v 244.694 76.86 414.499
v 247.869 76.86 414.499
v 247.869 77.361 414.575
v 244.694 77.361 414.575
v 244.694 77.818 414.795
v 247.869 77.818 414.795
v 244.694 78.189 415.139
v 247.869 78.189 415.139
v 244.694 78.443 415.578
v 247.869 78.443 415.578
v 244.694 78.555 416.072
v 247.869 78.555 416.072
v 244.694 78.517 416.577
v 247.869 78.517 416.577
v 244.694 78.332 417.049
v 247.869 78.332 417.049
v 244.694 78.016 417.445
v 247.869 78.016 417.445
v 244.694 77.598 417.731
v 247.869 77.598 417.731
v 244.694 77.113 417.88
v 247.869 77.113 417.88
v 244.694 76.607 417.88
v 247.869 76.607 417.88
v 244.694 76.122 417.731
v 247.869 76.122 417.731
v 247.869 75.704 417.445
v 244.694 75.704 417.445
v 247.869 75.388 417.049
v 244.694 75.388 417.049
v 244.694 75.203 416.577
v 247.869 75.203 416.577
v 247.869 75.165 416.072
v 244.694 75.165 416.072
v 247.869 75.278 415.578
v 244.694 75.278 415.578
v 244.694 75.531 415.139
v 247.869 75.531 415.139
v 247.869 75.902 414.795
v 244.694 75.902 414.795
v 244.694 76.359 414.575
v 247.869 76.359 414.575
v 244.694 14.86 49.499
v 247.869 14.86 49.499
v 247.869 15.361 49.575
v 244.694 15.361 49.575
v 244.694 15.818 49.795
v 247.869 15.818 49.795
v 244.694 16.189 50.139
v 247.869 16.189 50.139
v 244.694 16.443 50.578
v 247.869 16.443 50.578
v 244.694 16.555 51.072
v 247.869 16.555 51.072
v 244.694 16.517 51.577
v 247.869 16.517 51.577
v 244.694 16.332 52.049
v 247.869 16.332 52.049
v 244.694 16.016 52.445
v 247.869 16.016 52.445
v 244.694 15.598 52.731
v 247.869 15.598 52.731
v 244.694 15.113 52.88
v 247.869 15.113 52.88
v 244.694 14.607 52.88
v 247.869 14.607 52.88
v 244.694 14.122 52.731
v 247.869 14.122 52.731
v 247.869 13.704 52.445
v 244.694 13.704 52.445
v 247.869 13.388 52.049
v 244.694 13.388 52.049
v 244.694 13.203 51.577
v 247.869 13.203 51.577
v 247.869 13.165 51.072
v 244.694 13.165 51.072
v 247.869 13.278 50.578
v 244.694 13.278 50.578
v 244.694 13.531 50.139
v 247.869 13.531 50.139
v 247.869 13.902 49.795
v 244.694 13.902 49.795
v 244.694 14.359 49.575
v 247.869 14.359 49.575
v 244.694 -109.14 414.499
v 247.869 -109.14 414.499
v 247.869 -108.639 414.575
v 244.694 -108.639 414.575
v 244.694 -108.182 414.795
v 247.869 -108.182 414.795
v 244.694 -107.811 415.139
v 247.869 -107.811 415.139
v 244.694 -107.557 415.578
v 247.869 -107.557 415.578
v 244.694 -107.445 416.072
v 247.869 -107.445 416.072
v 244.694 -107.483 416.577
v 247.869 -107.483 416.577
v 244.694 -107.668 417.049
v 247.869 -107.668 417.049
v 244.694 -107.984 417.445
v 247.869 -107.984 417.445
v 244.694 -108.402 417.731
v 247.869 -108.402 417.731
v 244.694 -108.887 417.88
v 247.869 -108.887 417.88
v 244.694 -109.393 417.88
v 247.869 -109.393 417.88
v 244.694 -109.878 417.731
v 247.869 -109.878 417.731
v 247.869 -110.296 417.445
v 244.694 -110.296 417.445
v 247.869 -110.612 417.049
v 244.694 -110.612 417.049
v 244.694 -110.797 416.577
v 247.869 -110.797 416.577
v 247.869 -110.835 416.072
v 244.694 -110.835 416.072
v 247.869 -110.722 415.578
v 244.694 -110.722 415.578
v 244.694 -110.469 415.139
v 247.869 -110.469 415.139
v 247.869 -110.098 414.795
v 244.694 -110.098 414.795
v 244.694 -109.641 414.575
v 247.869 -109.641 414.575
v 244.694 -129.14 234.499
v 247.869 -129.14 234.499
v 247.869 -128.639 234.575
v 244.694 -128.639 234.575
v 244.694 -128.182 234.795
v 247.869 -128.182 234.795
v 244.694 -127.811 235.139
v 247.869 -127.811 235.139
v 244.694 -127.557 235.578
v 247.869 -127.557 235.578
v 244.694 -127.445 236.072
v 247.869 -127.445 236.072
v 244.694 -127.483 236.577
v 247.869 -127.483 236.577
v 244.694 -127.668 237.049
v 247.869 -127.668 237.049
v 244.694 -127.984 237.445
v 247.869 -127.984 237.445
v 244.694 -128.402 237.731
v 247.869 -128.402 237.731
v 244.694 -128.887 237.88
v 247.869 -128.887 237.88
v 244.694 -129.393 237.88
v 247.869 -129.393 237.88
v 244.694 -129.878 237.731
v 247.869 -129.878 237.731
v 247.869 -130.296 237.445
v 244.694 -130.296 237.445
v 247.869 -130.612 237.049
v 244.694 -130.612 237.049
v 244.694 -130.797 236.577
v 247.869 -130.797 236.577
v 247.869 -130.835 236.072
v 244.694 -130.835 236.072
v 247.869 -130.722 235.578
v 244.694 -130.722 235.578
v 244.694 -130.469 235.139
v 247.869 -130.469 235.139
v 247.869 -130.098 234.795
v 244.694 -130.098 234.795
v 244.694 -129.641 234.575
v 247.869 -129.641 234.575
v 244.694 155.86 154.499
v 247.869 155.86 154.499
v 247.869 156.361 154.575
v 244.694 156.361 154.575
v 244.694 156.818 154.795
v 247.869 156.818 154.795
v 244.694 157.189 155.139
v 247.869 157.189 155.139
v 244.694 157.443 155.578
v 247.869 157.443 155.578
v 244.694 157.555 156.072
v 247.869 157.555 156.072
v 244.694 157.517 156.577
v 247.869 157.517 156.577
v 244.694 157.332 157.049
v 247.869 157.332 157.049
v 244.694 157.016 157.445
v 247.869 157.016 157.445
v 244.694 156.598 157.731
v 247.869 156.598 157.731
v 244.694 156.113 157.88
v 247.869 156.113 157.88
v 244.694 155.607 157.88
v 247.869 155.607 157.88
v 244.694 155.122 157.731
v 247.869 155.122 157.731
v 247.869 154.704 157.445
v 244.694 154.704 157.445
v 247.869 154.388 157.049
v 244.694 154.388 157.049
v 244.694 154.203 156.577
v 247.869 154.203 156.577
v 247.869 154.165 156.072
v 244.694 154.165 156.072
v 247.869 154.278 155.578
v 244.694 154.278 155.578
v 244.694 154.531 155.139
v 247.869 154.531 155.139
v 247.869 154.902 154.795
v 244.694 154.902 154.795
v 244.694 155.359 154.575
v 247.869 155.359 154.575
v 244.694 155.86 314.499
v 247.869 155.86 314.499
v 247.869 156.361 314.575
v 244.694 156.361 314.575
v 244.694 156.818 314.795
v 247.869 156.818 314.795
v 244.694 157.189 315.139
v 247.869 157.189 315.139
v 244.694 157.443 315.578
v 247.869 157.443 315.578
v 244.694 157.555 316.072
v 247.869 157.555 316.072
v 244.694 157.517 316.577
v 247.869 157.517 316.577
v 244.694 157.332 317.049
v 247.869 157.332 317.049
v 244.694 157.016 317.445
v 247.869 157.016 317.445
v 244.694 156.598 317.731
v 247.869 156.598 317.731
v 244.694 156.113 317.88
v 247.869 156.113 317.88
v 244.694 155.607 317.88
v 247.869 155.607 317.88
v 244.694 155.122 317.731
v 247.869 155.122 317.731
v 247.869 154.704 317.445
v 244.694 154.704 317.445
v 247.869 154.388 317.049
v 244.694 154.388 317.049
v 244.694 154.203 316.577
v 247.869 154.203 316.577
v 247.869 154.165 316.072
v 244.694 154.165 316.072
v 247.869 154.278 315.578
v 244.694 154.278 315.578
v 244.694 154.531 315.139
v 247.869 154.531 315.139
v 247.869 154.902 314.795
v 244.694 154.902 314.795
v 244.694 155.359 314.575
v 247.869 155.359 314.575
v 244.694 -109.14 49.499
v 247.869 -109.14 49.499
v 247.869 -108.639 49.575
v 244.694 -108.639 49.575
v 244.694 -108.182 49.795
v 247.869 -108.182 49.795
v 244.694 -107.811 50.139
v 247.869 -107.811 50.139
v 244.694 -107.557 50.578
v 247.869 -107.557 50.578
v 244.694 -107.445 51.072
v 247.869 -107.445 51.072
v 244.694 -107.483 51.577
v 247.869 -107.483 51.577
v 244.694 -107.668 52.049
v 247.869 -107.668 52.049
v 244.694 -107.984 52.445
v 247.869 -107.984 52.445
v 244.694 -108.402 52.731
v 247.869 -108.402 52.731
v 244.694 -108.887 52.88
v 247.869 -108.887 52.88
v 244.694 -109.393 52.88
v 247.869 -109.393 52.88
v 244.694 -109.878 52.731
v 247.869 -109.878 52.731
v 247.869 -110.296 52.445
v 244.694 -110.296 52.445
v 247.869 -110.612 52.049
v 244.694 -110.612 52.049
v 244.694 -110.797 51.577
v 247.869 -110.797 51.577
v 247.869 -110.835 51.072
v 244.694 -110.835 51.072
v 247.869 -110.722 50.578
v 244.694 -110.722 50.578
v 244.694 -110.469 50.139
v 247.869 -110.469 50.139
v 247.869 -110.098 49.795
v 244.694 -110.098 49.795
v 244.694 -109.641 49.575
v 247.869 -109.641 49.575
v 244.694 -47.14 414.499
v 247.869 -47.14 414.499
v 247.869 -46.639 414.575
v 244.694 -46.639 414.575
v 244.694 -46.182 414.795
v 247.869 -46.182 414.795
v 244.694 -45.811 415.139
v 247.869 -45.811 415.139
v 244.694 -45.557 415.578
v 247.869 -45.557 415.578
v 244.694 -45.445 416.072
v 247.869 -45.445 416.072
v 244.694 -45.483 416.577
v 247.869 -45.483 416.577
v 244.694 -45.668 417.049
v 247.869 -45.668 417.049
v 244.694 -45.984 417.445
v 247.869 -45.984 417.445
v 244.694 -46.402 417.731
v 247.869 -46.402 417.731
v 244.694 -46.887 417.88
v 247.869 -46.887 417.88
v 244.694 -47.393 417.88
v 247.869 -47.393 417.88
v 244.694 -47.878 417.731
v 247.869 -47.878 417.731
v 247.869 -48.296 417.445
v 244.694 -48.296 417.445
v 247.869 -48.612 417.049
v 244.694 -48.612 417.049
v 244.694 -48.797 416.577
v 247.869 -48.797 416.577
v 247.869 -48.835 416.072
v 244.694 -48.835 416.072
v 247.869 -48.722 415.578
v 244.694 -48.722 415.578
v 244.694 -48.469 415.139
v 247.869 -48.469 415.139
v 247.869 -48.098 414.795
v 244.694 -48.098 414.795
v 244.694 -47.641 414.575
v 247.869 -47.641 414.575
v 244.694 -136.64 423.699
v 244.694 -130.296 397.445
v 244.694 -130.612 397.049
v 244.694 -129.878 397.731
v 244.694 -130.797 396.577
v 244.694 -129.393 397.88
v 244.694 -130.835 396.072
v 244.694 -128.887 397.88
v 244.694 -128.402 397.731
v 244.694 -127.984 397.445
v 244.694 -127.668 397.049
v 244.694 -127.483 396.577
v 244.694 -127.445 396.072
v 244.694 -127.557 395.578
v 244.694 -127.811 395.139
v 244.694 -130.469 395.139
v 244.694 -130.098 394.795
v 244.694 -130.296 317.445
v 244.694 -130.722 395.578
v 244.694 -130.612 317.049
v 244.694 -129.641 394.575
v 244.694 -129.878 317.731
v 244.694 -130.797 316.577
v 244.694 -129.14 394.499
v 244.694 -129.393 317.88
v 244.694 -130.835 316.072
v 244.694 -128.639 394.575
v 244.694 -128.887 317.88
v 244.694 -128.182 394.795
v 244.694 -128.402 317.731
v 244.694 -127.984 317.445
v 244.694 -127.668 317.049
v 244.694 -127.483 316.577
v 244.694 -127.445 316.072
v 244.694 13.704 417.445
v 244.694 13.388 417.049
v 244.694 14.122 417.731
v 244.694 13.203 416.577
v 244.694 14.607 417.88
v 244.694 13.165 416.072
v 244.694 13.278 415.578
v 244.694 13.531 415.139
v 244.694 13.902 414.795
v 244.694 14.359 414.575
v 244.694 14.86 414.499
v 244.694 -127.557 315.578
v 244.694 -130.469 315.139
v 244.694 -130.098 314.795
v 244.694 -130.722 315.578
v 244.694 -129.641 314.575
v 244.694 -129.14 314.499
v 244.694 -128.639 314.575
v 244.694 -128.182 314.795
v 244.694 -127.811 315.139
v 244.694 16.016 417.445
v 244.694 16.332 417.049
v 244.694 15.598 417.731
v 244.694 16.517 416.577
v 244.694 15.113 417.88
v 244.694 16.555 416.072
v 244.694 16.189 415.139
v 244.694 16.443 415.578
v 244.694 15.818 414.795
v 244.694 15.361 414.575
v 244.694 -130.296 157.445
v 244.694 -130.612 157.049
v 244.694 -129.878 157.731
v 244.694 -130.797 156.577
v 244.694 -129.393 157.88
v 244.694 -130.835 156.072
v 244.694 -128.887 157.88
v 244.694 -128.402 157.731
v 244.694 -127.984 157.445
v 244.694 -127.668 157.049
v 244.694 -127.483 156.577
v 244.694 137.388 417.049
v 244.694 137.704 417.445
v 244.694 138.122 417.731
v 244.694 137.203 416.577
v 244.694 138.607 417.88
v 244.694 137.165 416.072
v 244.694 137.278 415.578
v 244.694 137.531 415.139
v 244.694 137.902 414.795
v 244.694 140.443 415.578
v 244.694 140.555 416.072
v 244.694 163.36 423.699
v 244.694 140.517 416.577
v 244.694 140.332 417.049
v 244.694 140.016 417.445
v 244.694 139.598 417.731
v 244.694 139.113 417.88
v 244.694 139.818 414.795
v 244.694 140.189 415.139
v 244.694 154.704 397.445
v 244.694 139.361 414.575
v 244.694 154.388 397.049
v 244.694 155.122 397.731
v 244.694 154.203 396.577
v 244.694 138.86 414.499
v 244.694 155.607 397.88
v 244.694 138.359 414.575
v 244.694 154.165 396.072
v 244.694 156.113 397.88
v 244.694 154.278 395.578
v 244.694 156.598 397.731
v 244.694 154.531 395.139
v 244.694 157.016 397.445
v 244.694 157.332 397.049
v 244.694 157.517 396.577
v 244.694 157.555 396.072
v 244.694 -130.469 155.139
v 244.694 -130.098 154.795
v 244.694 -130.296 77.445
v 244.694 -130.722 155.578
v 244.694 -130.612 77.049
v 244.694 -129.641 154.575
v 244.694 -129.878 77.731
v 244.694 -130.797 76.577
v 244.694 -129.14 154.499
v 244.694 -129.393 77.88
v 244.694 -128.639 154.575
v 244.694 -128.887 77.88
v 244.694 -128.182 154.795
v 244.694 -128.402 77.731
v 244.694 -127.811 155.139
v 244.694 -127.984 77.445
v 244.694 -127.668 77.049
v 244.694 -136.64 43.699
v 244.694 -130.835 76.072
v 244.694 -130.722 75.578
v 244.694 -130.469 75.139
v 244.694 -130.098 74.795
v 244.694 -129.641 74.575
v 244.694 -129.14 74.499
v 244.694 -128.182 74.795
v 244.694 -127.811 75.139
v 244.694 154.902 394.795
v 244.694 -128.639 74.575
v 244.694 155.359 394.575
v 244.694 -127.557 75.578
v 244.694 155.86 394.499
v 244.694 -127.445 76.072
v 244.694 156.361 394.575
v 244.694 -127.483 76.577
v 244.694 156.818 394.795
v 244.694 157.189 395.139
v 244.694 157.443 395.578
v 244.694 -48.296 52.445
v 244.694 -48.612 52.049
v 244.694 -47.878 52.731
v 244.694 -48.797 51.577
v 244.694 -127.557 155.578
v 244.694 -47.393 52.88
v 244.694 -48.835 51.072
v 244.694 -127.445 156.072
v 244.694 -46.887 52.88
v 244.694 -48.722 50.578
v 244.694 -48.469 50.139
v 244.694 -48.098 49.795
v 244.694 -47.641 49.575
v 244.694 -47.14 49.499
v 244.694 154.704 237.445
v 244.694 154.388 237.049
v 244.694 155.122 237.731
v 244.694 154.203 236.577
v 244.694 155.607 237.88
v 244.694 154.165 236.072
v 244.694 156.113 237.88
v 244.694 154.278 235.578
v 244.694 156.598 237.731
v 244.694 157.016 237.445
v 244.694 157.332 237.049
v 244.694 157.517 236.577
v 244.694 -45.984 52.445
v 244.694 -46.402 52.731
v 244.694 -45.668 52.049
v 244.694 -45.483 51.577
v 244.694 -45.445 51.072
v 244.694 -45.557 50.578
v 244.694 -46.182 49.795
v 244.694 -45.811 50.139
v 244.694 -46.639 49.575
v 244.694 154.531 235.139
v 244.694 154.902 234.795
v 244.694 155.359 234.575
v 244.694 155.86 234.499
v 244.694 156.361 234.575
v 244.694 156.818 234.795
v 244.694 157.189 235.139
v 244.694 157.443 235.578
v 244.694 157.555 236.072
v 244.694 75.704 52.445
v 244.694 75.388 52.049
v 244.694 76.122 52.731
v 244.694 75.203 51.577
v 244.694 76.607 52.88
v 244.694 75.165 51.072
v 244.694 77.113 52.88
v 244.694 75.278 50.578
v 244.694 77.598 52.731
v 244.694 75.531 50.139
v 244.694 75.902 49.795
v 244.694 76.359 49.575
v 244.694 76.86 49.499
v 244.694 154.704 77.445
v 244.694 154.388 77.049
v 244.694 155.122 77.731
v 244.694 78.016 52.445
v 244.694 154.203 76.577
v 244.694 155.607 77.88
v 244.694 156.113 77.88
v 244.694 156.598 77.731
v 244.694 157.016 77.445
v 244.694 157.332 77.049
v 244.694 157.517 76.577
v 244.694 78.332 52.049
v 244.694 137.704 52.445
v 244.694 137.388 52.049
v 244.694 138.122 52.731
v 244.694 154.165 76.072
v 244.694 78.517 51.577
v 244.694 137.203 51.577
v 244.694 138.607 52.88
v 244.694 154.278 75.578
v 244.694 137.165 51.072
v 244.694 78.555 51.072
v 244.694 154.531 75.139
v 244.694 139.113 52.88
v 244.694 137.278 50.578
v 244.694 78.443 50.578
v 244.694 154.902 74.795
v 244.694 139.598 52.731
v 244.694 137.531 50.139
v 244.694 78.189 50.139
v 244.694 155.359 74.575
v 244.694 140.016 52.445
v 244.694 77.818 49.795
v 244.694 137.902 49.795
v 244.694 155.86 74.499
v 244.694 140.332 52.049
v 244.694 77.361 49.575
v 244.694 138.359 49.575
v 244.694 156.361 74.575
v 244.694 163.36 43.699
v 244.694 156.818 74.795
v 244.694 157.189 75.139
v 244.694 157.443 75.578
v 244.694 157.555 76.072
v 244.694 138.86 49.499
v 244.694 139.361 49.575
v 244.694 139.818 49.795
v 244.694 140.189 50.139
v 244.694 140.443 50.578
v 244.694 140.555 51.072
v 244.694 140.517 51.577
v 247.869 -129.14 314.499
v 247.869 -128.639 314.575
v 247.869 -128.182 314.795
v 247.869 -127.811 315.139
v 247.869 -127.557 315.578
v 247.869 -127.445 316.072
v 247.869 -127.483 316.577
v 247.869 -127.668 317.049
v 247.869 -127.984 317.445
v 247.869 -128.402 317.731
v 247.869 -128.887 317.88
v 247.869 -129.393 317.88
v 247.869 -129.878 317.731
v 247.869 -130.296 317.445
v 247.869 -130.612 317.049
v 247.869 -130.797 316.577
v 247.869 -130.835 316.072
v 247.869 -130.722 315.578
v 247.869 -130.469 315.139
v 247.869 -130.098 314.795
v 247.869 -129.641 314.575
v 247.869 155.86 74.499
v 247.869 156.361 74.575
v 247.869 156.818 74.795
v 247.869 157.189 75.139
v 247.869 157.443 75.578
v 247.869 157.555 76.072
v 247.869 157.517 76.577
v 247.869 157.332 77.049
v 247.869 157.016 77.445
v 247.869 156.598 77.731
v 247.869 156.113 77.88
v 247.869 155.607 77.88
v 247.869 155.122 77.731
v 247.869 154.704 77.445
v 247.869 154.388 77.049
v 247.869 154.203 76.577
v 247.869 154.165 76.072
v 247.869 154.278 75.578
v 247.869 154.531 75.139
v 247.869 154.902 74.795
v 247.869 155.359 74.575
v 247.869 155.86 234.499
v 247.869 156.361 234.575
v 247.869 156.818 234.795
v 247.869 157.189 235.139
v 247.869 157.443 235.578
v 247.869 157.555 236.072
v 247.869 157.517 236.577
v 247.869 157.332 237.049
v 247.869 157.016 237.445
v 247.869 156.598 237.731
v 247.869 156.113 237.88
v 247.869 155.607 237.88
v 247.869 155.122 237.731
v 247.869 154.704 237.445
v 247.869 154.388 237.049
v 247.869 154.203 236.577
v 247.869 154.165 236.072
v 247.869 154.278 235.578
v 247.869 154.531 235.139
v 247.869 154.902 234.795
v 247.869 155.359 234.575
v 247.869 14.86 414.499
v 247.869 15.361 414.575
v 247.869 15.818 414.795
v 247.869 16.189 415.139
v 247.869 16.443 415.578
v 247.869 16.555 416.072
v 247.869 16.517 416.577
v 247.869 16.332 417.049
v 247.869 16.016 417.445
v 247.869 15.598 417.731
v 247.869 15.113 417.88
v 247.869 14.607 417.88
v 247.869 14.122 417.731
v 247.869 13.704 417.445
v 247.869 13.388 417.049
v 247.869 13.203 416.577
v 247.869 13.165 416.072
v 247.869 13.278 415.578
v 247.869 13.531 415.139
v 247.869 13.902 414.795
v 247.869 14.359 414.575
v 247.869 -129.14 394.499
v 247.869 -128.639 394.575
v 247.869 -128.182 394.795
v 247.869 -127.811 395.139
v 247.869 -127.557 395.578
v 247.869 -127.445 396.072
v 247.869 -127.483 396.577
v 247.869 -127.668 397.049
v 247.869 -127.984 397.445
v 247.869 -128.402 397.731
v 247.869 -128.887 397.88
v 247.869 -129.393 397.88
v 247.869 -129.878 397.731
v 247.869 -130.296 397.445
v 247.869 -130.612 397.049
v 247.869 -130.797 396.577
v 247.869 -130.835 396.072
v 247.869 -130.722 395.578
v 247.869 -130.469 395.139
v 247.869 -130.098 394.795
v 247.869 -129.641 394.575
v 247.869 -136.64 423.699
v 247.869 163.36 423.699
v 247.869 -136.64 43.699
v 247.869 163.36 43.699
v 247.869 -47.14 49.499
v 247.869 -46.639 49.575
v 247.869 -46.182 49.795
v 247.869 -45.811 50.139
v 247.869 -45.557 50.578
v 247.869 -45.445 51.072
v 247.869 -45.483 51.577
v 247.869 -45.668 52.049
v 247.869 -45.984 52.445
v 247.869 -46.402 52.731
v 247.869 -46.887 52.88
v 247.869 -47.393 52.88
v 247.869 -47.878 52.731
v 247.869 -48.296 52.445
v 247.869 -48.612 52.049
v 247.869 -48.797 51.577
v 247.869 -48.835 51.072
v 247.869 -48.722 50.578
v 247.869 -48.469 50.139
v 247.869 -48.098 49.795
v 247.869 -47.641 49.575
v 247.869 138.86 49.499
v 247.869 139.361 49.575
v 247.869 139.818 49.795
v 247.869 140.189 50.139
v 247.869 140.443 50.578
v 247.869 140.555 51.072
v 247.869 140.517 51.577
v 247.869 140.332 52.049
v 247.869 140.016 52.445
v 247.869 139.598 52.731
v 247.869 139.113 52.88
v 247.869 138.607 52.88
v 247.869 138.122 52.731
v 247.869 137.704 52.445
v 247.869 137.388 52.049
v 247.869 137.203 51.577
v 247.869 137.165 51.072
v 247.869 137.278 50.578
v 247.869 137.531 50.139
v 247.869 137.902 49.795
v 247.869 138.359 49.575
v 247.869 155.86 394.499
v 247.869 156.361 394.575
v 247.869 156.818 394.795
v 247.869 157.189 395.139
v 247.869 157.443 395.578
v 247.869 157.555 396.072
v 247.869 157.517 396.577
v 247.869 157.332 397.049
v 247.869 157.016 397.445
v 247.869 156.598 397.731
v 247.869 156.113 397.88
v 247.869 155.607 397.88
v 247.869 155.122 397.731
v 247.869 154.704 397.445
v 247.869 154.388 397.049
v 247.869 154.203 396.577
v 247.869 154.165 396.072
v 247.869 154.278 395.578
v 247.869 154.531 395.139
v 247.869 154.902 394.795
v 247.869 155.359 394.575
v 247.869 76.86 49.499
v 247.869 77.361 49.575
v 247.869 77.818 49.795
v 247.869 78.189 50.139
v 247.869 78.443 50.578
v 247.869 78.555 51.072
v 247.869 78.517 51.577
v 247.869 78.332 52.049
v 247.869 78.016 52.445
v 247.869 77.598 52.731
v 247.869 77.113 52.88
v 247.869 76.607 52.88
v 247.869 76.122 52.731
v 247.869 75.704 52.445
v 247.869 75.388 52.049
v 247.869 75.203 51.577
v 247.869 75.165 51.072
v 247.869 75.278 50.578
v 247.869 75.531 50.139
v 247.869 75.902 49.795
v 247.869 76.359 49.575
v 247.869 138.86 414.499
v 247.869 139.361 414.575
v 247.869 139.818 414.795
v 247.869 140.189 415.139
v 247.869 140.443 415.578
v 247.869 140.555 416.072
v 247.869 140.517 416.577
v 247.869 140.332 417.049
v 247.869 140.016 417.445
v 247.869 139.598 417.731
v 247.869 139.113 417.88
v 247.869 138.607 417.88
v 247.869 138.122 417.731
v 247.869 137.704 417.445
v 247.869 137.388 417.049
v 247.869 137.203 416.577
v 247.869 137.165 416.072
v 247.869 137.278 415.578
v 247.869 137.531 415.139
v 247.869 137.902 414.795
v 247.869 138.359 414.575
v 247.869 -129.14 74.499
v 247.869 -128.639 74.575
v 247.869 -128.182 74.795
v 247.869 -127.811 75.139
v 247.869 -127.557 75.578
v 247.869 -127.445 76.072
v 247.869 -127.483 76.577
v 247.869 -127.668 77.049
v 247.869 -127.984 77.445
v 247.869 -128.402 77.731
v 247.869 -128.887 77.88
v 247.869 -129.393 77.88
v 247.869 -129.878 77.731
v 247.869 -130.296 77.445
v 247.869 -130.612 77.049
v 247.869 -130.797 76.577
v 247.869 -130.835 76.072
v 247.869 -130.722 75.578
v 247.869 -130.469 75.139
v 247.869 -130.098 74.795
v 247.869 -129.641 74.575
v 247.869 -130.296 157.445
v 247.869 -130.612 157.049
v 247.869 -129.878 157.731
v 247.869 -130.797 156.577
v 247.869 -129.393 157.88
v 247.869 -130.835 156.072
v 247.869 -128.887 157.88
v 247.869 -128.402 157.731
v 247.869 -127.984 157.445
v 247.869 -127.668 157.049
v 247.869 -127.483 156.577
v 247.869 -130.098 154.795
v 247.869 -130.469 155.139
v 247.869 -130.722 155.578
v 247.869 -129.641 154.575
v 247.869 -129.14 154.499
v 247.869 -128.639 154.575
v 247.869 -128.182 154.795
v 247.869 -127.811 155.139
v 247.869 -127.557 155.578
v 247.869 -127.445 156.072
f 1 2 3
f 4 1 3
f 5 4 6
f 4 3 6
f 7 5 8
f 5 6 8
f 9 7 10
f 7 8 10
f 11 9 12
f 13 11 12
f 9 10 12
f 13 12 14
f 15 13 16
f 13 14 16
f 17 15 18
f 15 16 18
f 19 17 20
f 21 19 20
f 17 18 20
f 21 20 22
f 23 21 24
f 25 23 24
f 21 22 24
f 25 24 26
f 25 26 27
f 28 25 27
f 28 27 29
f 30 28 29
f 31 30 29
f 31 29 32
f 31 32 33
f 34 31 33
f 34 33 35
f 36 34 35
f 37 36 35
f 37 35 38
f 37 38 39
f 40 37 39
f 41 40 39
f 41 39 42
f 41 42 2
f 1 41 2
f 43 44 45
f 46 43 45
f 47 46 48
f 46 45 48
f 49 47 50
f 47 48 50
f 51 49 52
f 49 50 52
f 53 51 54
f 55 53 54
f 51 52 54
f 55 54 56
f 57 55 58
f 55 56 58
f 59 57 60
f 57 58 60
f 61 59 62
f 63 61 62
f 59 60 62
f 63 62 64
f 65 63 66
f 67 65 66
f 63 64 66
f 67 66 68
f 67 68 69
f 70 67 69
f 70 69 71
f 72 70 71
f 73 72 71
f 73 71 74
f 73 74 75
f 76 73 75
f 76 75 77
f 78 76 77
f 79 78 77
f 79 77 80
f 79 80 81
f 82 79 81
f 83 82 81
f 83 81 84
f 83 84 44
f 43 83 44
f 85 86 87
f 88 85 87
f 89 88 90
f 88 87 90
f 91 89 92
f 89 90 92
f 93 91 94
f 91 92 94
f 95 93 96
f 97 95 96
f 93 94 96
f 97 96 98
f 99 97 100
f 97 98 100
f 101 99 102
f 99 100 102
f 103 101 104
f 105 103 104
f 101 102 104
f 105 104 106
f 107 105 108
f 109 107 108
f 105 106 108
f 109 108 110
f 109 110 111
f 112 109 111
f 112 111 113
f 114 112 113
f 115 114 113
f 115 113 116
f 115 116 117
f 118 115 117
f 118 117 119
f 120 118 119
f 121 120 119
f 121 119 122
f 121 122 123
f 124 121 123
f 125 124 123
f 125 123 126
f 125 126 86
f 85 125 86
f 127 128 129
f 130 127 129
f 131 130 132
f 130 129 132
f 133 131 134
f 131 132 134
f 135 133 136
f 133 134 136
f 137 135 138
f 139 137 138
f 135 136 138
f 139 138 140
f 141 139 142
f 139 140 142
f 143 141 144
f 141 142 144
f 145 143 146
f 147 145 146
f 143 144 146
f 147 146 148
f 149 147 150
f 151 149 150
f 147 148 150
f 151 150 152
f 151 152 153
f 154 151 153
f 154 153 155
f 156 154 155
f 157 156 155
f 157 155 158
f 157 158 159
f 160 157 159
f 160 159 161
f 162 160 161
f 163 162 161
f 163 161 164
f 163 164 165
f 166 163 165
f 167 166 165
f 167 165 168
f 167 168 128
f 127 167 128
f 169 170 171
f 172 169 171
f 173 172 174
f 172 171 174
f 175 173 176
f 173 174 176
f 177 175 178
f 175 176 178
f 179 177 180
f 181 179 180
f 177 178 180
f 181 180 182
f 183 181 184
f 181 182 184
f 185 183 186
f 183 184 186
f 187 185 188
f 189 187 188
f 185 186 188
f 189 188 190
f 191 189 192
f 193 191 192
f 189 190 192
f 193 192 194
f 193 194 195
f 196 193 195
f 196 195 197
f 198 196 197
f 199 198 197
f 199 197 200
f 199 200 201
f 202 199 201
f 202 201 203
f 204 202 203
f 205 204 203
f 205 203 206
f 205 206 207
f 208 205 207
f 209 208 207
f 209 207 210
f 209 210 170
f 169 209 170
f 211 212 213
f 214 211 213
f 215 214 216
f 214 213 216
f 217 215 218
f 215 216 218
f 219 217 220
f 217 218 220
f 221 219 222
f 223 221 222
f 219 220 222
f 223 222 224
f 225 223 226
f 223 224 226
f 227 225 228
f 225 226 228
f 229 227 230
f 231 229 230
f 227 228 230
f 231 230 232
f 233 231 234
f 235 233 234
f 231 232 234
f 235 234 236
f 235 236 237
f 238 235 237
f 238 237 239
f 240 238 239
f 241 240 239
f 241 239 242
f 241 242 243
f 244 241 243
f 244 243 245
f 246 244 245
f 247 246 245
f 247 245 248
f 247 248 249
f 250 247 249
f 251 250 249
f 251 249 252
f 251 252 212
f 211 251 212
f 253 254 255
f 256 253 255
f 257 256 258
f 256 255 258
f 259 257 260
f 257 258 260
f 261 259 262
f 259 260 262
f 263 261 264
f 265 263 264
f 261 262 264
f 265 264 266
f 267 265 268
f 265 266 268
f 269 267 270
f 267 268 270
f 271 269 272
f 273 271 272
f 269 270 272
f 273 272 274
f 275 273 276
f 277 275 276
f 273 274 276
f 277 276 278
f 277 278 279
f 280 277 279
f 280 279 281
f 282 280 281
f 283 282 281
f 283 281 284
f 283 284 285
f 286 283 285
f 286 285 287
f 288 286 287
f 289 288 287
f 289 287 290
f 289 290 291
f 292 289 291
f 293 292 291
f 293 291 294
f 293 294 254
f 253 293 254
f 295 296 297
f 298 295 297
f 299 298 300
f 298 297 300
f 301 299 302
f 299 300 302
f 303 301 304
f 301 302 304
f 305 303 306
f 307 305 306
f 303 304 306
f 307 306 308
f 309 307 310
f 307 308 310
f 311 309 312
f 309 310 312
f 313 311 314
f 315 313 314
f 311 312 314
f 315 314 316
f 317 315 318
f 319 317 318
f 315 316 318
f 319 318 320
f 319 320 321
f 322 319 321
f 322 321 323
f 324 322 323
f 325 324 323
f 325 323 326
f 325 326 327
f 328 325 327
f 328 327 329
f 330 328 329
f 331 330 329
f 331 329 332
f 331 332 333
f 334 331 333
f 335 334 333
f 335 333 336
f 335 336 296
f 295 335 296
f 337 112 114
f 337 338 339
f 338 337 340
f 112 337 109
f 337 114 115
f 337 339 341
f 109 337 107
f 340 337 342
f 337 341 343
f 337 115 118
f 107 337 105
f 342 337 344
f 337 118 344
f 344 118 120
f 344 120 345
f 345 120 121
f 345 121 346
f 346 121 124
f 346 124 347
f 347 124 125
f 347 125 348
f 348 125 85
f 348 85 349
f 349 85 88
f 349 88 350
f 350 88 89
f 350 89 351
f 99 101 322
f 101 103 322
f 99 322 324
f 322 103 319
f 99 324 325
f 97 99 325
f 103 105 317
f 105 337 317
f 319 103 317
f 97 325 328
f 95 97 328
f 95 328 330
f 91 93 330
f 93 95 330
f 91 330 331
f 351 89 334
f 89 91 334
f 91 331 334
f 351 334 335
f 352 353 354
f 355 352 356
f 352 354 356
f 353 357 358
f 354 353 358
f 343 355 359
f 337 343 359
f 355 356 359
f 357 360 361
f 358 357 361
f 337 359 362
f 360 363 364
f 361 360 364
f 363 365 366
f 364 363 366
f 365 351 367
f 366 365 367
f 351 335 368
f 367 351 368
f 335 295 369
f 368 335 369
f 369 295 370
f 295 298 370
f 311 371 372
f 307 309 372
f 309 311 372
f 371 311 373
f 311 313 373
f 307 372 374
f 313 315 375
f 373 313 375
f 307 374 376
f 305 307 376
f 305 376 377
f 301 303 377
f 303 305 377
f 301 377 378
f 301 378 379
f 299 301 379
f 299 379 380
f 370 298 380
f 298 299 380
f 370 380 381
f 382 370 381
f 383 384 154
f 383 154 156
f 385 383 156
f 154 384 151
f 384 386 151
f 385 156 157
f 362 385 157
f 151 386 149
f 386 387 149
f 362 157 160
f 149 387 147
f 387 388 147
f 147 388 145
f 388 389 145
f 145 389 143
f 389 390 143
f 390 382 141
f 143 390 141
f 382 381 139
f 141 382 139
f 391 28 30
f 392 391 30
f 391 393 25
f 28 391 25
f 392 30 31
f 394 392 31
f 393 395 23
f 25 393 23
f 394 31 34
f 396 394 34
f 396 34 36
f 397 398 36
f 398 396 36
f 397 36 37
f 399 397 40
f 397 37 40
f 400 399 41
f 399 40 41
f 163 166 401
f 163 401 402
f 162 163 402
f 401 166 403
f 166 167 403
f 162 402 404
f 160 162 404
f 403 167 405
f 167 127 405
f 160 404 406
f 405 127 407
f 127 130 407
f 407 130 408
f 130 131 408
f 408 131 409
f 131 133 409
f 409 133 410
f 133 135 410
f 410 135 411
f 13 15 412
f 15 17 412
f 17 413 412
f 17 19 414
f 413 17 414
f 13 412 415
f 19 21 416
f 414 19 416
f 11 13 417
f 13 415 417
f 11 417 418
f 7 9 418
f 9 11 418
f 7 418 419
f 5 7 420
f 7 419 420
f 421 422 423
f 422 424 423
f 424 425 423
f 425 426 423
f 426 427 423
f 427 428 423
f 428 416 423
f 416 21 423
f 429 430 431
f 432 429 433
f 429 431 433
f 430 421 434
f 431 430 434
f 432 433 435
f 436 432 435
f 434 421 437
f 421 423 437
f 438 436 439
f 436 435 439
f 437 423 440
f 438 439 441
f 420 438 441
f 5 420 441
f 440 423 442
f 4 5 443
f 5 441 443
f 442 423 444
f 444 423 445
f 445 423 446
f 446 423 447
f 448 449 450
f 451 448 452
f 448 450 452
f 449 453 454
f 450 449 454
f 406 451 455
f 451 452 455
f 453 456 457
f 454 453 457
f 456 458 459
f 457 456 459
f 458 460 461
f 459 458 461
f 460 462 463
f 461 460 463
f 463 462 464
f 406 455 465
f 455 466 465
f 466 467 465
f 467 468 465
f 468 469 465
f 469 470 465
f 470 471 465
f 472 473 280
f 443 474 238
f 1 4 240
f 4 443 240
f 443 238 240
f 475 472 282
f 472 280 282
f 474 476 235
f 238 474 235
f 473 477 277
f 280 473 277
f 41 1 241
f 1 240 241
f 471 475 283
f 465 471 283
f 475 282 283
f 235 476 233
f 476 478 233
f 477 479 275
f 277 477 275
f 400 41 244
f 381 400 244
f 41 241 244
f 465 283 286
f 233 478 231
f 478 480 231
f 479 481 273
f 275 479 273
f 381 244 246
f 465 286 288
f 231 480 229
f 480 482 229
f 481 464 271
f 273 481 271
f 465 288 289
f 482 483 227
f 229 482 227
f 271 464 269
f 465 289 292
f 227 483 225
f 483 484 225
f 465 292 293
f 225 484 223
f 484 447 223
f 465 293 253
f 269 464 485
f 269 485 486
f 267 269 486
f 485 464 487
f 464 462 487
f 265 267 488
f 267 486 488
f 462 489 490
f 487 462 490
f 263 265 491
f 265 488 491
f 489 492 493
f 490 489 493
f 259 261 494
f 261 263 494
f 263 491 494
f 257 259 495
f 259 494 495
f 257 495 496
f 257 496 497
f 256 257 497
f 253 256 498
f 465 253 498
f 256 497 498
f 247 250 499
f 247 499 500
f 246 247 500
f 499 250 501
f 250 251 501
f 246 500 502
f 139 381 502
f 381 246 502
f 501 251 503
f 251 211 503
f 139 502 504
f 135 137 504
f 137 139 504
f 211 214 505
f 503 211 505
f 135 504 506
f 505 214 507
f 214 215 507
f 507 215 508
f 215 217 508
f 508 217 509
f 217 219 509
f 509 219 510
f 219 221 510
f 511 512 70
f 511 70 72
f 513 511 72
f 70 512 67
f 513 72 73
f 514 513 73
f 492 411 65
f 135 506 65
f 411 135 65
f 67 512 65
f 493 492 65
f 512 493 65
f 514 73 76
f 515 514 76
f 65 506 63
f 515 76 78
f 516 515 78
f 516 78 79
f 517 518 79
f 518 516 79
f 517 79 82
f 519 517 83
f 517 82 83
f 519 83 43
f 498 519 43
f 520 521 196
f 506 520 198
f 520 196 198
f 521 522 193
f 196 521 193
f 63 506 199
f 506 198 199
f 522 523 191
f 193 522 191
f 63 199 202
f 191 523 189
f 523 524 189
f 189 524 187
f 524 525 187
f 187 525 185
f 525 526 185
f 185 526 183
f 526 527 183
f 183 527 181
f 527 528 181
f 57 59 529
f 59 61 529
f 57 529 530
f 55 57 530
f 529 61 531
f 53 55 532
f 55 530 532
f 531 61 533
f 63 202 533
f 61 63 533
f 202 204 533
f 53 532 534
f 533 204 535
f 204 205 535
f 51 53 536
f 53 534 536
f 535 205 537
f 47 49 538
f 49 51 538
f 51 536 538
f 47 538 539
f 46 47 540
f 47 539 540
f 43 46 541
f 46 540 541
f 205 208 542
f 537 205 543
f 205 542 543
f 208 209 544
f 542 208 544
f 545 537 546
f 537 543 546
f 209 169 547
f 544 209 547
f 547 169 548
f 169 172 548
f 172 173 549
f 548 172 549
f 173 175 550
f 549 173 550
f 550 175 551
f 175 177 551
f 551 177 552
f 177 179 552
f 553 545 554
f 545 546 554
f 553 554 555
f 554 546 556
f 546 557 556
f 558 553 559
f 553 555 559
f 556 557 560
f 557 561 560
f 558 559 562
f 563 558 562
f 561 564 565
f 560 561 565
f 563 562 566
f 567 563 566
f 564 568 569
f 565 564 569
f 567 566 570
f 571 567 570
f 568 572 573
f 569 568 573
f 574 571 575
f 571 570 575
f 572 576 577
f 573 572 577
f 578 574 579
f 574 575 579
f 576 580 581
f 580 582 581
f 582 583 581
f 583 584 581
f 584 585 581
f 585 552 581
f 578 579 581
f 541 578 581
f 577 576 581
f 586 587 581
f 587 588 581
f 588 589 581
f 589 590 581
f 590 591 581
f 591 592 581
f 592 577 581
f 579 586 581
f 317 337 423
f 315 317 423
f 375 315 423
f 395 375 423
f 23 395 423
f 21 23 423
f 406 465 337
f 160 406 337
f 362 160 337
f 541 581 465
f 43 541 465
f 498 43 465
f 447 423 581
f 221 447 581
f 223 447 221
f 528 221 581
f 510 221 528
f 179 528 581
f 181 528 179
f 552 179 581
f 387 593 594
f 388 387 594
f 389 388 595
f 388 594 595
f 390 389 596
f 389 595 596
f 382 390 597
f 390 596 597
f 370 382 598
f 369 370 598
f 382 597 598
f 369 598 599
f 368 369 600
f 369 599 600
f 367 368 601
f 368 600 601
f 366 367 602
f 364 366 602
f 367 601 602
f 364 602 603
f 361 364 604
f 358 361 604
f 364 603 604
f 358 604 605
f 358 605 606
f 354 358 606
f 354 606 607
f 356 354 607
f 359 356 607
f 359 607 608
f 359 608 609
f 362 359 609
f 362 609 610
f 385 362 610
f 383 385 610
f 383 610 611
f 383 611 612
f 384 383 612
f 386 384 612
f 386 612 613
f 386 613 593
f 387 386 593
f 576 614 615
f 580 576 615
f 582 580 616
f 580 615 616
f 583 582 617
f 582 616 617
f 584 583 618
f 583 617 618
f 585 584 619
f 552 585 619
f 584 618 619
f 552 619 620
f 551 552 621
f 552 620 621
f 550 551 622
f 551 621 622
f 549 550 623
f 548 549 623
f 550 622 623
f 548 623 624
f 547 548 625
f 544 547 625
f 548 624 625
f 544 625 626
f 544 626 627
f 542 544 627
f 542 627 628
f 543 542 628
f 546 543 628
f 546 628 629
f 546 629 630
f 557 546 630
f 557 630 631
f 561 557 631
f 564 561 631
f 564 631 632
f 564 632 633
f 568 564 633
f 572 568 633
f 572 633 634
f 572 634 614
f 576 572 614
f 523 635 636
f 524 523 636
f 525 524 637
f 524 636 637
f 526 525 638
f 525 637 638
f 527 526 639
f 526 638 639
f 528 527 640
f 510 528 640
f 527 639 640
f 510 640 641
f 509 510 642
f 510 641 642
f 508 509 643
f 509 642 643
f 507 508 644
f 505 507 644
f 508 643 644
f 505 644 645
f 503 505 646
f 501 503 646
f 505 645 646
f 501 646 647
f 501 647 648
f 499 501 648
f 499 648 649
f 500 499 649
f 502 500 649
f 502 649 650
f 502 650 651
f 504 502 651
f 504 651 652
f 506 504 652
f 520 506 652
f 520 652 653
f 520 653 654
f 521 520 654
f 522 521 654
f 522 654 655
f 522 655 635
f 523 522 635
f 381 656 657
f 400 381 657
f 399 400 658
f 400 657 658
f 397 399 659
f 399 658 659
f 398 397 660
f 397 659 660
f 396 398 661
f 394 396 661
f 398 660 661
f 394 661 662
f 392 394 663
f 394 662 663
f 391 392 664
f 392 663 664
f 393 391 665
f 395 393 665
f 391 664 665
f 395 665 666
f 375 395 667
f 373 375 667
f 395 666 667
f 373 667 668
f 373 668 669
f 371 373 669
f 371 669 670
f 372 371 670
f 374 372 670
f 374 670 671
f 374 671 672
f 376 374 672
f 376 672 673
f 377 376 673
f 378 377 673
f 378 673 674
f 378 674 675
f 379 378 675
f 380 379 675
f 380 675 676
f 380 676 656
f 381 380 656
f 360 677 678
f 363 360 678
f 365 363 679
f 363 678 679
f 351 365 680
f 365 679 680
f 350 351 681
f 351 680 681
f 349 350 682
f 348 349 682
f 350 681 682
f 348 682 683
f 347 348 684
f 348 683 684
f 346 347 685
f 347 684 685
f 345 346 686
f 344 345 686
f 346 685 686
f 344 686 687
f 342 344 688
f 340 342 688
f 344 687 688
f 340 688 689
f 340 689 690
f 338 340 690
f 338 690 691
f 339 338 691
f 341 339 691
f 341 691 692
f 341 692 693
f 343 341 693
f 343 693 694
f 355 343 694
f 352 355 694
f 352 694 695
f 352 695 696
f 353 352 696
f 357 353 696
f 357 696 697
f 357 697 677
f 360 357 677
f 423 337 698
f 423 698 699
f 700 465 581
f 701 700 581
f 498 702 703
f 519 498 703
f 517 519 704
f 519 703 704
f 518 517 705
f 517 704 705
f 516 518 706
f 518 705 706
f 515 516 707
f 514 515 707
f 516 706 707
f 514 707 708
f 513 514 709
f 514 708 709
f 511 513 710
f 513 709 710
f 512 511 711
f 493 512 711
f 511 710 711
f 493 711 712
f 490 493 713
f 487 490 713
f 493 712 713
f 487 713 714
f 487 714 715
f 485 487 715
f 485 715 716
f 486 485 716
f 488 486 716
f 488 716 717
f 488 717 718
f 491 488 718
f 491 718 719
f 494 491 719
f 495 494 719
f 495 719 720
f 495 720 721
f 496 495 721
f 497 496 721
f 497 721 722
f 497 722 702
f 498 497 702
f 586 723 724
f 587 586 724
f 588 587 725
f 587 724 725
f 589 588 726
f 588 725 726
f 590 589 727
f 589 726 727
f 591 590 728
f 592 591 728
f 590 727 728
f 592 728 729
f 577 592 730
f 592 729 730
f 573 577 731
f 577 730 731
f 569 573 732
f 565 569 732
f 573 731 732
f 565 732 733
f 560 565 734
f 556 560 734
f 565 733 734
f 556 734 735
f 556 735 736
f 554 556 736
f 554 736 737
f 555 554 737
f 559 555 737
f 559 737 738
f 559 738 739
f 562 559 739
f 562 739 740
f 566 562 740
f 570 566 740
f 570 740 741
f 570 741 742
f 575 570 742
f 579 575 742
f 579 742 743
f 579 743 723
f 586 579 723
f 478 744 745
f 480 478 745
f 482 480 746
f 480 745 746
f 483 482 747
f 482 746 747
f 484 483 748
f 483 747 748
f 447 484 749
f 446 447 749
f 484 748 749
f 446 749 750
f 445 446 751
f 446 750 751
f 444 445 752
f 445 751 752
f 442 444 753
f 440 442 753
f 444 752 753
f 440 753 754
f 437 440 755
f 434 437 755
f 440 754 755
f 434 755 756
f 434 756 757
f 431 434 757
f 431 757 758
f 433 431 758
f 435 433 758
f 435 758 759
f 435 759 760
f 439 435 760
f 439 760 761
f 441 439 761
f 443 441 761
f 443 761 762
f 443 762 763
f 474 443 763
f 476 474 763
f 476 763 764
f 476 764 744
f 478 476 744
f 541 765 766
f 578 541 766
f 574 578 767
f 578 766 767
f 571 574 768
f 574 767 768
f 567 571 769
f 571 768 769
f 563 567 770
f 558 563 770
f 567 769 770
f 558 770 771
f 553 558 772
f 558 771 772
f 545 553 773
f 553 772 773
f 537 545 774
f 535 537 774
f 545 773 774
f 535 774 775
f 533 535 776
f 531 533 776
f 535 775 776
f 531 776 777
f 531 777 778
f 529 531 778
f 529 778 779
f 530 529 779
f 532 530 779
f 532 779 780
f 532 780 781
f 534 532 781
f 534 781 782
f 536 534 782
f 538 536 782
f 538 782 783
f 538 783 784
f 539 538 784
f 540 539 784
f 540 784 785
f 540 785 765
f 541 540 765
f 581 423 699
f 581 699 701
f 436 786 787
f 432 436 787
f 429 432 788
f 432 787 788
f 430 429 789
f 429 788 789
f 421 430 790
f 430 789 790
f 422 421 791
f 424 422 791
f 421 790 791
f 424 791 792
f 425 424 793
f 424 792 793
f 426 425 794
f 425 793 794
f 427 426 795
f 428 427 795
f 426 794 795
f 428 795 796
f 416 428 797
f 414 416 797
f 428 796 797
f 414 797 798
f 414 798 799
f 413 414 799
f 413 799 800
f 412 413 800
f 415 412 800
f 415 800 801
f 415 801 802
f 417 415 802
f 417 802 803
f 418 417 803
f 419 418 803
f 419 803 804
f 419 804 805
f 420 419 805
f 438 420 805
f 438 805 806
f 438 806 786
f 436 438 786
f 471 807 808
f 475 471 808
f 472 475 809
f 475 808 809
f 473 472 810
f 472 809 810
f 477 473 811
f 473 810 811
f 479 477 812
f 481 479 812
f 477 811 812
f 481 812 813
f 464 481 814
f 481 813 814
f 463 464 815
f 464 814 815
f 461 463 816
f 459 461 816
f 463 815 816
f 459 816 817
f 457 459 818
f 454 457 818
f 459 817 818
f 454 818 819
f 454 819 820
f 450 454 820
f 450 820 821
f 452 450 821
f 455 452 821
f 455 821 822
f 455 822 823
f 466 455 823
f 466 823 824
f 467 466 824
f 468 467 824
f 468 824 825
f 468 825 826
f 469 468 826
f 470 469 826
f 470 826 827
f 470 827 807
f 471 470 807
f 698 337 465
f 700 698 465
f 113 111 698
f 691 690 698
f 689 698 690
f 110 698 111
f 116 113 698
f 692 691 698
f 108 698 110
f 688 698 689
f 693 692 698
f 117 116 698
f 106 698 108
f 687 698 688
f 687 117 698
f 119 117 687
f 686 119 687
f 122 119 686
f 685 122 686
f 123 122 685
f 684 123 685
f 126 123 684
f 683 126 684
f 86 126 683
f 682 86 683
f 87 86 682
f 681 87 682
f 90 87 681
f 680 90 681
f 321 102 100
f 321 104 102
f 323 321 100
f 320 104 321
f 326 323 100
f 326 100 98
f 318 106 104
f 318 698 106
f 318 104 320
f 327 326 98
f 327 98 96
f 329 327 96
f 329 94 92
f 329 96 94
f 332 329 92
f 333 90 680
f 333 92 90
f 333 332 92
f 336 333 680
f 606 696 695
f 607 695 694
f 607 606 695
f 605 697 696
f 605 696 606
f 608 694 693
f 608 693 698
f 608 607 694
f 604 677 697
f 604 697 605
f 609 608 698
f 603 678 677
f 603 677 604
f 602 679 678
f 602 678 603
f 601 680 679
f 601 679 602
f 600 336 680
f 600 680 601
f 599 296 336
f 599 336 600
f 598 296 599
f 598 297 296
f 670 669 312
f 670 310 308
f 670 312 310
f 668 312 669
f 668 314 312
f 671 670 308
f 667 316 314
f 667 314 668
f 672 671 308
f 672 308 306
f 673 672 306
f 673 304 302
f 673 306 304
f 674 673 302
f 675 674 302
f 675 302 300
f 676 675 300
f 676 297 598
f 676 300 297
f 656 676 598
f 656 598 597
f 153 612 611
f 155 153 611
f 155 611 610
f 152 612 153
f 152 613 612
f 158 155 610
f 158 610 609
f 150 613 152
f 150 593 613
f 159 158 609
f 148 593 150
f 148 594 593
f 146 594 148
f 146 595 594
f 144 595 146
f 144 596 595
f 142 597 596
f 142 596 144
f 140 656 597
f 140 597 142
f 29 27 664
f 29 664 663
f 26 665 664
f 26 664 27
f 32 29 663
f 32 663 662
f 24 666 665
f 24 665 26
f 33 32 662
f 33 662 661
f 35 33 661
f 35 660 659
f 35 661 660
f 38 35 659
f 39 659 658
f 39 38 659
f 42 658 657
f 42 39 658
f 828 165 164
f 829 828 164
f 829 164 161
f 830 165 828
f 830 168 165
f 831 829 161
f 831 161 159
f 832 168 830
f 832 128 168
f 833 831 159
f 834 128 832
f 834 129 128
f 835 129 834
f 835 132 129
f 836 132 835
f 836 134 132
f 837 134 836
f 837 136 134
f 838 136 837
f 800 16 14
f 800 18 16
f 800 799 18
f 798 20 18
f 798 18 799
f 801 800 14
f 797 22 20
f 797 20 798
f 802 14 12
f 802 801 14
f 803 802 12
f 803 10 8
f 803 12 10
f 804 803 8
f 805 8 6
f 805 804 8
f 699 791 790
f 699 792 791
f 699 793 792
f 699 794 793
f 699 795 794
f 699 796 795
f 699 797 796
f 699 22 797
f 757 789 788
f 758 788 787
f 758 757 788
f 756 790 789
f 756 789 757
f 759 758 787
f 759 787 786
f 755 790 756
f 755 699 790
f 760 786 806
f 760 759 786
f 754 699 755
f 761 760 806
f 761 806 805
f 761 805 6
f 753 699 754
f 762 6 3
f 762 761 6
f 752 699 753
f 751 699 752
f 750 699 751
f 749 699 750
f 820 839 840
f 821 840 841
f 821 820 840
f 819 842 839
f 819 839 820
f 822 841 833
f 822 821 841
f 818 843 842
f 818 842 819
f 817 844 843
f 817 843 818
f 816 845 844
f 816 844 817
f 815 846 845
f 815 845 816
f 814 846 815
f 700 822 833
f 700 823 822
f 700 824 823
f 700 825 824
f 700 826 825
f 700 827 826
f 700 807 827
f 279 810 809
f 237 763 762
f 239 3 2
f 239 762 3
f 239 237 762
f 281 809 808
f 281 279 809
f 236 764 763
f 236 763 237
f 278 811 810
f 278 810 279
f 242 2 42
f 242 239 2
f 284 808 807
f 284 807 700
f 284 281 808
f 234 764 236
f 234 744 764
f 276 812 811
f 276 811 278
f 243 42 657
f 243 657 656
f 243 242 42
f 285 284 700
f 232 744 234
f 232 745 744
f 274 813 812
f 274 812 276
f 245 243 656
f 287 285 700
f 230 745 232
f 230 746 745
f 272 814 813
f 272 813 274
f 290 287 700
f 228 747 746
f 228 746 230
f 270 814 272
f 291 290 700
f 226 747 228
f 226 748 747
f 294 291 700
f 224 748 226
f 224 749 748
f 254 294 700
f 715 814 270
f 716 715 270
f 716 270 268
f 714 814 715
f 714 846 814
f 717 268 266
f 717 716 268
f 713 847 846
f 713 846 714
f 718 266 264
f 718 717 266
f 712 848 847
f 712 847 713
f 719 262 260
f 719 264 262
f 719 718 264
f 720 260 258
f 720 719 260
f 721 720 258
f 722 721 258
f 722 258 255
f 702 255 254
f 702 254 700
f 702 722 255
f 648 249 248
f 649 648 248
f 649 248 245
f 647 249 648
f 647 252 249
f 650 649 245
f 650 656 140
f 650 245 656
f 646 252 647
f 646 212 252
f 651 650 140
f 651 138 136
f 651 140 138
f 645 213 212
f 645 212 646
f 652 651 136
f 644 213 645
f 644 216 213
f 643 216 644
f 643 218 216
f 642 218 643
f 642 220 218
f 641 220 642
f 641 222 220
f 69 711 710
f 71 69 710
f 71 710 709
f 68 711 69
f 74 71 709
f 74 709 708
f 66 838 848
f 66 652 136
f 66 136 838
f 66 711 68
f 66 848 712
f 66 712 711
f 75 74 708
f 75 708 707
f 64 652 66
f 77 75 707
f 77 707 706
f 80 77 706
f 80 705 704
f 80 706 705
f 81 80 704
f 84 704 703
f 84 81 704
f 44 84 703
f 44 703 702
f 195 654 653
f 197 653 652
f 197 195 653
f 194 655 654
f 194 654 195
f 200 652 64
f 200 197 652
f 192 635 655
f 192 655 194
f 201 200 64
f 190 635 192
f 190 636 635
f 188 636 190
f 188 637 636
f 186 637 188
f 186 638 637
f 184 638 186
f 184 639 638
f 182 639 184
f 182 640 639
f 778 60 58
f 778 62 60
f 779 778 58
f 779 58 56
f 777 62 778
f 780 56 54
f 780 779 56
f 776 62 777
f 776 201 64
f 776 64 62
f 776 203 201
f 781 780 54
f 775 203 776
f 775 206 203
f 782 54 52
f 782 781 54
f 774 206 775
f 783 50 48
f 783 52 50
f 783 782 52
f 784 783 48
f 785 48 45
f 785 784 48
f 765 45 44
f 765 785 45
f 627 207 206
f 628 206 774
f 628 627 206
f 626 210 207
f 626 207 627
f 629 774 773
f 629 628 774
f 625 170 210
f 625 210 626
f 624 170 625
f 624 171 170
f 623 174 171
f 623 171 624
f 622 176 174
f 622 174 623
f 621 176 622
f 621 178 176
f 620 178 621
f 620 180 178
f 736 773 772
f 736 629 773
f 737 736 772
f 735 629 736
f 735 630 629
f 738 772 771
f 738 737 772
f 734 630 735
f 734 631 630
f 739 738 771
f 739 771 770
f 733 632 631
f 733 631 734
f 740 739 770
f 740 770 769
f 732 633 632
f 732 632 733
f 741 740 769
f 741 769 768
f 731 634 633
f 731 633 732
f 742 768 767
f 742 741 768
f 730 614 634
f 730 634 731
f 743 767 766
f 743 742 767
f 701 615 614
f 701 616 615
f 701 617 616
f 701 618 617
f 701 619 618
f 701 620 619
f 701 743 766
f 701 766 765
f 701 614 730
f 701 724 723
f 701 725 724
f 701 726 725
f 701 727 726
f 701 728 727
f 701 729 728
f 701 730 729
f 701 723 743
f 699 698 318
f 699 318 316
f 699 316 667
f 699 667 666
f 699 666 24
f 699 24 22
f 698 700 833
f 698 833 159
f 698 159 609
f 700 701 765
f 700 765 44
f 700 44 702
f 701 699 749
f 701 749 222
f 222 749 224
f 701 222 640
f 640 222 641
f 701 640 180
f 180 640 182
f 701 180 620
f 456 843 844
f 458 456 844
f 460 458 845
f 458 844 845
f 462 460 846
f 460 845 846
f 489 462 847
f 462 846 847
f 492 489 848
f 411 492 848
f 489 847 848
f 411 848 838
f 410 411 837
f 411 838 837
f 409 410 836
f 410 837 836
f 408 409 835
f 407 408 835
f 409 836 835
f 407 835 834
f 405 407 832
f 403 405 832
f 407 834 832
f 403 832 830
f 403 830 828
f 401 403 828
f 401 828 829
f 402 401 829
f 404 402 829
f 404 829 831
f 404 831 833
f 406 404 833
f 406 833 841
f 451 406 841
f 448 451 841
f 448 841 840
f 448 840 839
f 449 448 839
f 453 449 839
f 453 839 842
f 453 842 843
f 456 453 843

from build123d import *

# Parameters (mm, degrees)
SKETCH1_W         = 380
SKETCH1_H         = 300
PLATE_DEPTH       = 3.175
RAIL_MOUNTS_REACH = 456.112
SKETCH2_R         = 1.7


with BuildPart() as part:
    # Sketch1 → Plate (new body)
    with BuildSketch(Plane(origin=(244.693827342, 0, 0), x_dir=(0, 0, -1), z_dir=(1, 0, 0))):
        with Locations((-233.699106879, 13.360031127)):
            Rectangle(SKETCH1_W, SKETCH1_H)
    extrude(amount=PLATE_DEPTH)

    # Sketch2 → Rail_Mounts (cut, up to next)
    with BuildSketch(Plane(origin=(247.868827342, 0, 0), x_dir=(0, 0, -1), z_dir=(1, 0, 0)), mode=Mode.PRIVATE) as rail_mounts_sk1:
        with Locations((-396.199106879, 155.860031127)):
            Circle(SKETCH2_R)
    rail_mounts_tool1 = extrude(rail_mounts_sk1.sketch, amount=-RAIL_MOUNTS_REACH, mode=Mode.PRIVATE) & part.part
    # Sketch2 → Rail_Mounts (cut, up to next)
    with BuildSketch(Plane(origin=(247.868827342, 0, 0), x_dir=(0, 0, -1), z_dir=(1, 0, 0)), mode=Mode.PRIVATE) as rail_mounts_sk2:
        with Locations((-396.199106879, -129.139968873)):
            Circle(SKETCH2_R)
    rail_mounts_tool2 = extrude(rail_mounts_sk2.sketch, amount=-RAIL_MOUNTS_REACH, mode=Mode.PRIVATE) & part.part
    # Sketch2 → Rail_Mounts (cut, up to next)
    with BuildSketch(Plane(origin=(247.868827342, 0, 0), x_dir=(0, 0, -1), z_dir=(1, 0, 0)), mode=Mode.PRIVATE) as rail_mounts_sk3:
        with Locations((-316.199106879, 155.860031127)):
            Circle(SKETCH2_R)
    rail_mounts_tool3 = extrude(rail_mounts_sk3.sketch, amount=-RAIL_MOUNTS_REACH, mode=Mode.PRIVATE) & part.part
    # Sketch2 → Rail_Mounts (cut, up to next)
    with BuildSketch(Plane(origin=(247.868827342, 0, 0), x_dir=(0, 0, -1), z_dir=(1, 0, 0)), mode=Mode.PRIVATE) as rail_mounts_sk4:
        with Locations((-316.199106879, -129.139968873)):
            Circle(SKETCH2_R)
    rail_mounts_tool4 = extrude(rail_mounts_sk4.sketch, amount=-RAIL_MOUNTS_REACH, mode=Mode.PRIVATE) & part.part
    # Sketch2 → Rail_Mounts (cut, up to next)
    with BuildSketch(Plane(origin=(247.868827342, 0, 0), x_dir=(0, 0, -1), z_dir=(1, 0, 0)), mode=Mode.PRIVATE) as rail_mounts_sk5:
        with Locations((-236.199106879, 155.860031127)):
            Circle(SKETCH2_R)
    rail_mounts_tool5 = extrude(rail_mounts_sk5.sketch, amount=-RAIL_MOUNTS_REACH, mode=Mode.PRIVATE) & part.part
    # Sketch2 → Rail_Mounts (cut, up to next)
    with BuildSketch(Plane(origin=(247.868827342, 0, 0), x_dir=(0, 0, -1), z_dir=(1, 0, 0)), mode=Mode.PRIVATE) as rail_mounts_sk6:
        with Locations((-236.199106879, -129.139968873)):
            Circle(SKETCH2_R)
    rail_mounts_tool6 = extrude(rail_mounts_sk6.sketch, amount=-RAIL_MOUNTS_REACH, mode=Mode.PRIVATE) & part.part
    # Sketch2 → Rail_Mounts (cut, up to next)
    with BuildSketch(Plane(origin=(247.868827342, 0, 0), x_dir=(0, 0, -1), z_dir=(1, 0, 0)), mode=Mode.PRIVATE) as rail_mounts_sk7:
        with Locations((-156.199106879, 155.860031127)):
            Circle(SKETCH2_R)
    rail_mounts_tool7 = extrude(rail_mounts_sk7.sketch, amount=-RAIL_MOUNTS_REACH, mode=Mode.PRIVATE) & part.part
    # Sketch2 → Rail_Mounts (cut, up to next)
    with BuildSketch(Plane(origin=(247.868827342, 0, 0), x_dir=(0, 0, -1), z_dir=(1, 0, 0)), mode=Mode.PRIVATE) as rail_mounts_sk8:
        with Locations((-156.199106879, -129.139968873)):
            Circle(SKETCH2_R)
    rail_mounts_tool8 = extrude(rail_mounts_sk8.sketch, amount=-RAIL_MOUNTS_REACH, mode=Mode.PRIVATE) & part.part
    # Sketch2 → Rail_Mounts (cut, up to next)
    with BuildSketch(Plane(origin=(247.868827342, 0, 0), x_dir=(0, 0, -1), z_dir=(1, 0, 0)), mode=Mode.PRIVATE) as rail_mounts_sk9:
        with Locations((-76.199106879, 155.860031127)):
            Circle(SKETCH2_R)
    rail_mounts_tool9 = extrude(rail_mounts_sk9.sketch, amount=-RAIL_MOUNTS_REACH, mode=Mode.PRIVATE) & part.part
    # Sketch2 → Rail_Mounts (cut, up to next)
    with BuildSketch(Plane(origin=(247.868827342, 0, 0), x_dir=(0, 0, -1), z_dir=(1, 0, 0)), mode=Mode.PRIVATE) as rail_mounts_sk10:
        with Locations((-76.199106879, -129.139968873)):
            Circle(SKETCH2_R)
    rail_mounts_tool10 = extrude(rail_mounts_sk10.sketch, amount=-RAIL_MOUNTS_REACH, mode=Mode.PRIVATE) & part.part
    # Sketch2 → Rail_Mounts (cut, up to next)
    with BuildSketch(Plane(origin=(247.868827342, 0, 0), x_dir=(0, 0, -1), z_dir=(1, 0, 0)), mode=Mode.PRIVATE) as rail_mounts_sk11:
        with Locations((-416.199106879, -109.139968873)):
            Circle(SKETCH2_R)
    rail_mounts_tool11 = extrude(rail_mounts_sk11.sketch, amount=-RAIL_MOUNTS_REACH, mode=Mode.PRIVATE) & part.part
    # Sketch2 → Rail_Mounts (cut, up to next)
    with BuildSketch(Plane(origin=(247.868827342, 0, 0), x_dir=(0, 0, -1), z_dir=(1, 0, 0)), mode=Mode.PRIVATE) as rail_mounts_sk12:
        with Locations((-51.199106879, -109.139968873)):
            Circle(SKETCH2_R)
    rail_mounts_tool12 = extrude(rail_mounts_sk12.sketch, amount=-RAIL_MOUNTS_REACH, mode=Mode.PRIVATE) & part.part
    # Sketch2 → Rail_Mounts (cut, up to next)
    with BuildSketch(Plane(origin=(247.868827342, 0, 0), x_dir=(0, 0, -1), z_dir=(1, 0, 0)), mode=Mode.PRIVATE) as rail_mounts_sk13:
        with Locations((-51.199106879, -47.139968873)):
            Circle(SKETCH2_R)
    rail_mounts_tool13 = extrude(rail_mounts_sk13.sketch, amount=-RAIL_MOUNTS_REACH, mode=Mode.PRIVATE) & part.part
    # Sketch2 → Rail_Mounts (cut, up to next)
    with BuildSketch(Plane(origin=(247.868827342, 0, 0), x_dir=(0, 0, -1), z_dir=(1, 0, 0)), mode=Mode.PRIVATE) as rail_mounts_sk14:
        with Locations((-416.199106879, -47.139968873)):
            Circle(SKETCH2_R)
    rail_mounts_tool14 = extrude(rail_mounts_sk14.sketch, amount=-RAIL_MOUNTS_REACH, mode=Mode.PRIVATE) & part.part
    # Sketch2 → Rail_Mounts (cut, up to next)
    with BuildSketch(Plane(origin=(247.868827342, 0, 0), x_dir=(0, 0, -1), z_dir=(1, 0, 0)), mode=Mode.PRIVATE) as rail_mounts_sk15:
        with Locations((-51.199106879, 14.860031127)):
            Circle(SKETCH2_R)
    rail_mounts_tool15 = extrude(rail_mounts_sk15.sketch, amount=-RAIL_MOUNTS_REACH, mode=Mode.PRIVATE) & part.part
    # Sketch2 → Rail_Mounts (cut, up to next)
    with BuildSketch(Plane(origin=(247.868827342, 0, 0), x_dir=(0, 0, -1), z_dir=(1, 0, 0)), mode=Mode.PRIVATE) as rail_mounts_sk16:
        with Locations((-416.199106879, 14.860031127)):
            Circle(SKETCH2_R)
    rail_mounts_tool16 = extrude(rail_mounts_sk16.sketch, amount=-RAIL_MOUNTS_REACH, mode=Mode.PRIVATE) & part.part
    # Sketch2 → Rail_Mounts (cut, up to next)
    with BuildSketch(Plane(origin=(247.868827342, 0, 0), x_dir=(0, 0, -1), z_dir=(1, 0, 0)), mode=Mode.PRIVATE) as rail_mounts_sk17:
        with Locations((-51.199106879, 76.860031127)):
            Circle(SKETCH2_R)
    rail_mounts_tool17 = extrude(rail_mounts_sk17.sketch, amount=-RAIL_MOUNTS_REACH, mode=Mode.PRIVATE) & part.part
    # Sketch2 → Rail_Mounts (cut, up to next)
    with BuildSketch(Plane(origin=(247.868827342, 0, 0), x_dir=(0, 0, -1), z_dir=(1, 0, 0)), mode=Mode.PRIVATE) as rail_mounts_sk18:
        with Locations((-416.199106879, 76.860031127)):
            Circle(SKETCH2_R)
    rail_mounts_tool18 = extrude(rail_mounts_sk18.sketch, amount=-RAIL_MOUNTS_REACH, mode=Mode.PRIVATE) & part.part
    # Sketch2 → Rail_Mounts (cut, up to next)
    with BuildSketch(Plane(origin=(247.868827342, 0, 0), x_dir=(0, 0, -1), z_dir=(1, 0, 0)), mode=Mode.PRIVATE) as rail_mounts_sk19:
        with Locations((-51.199106879, 138.860031127)):
            Circle(SKETCH2_R)
    rail_mounts_tool19 = extrude(rail_mounts_sk19.sketch, amount=-RAIL_MOUNTS_REACH, mode=Mode.PRIVATE) & part.part
    # Sketch2 → Rail_Mounts (cut, up to next)
    with BuildSketch(Plane(origin=(247.868827342, 0, 0), x_dir=(0, 0, -1), z_dir=(1, 0, 0)), mode=Mode.PRIVATE) as rail_mounts_sk20:
        with Locations((-416.199106879, 138.860031127)):
            Circle(SKETCH2_R)
    rail_mounts_tool20 = extrude(rail_mounts_sk20.sketch, amount=-RAIL_MOUNTS_REACH, mode=Mode.PRIVATE) & part.part
    add(rail_mounts_tool1.solids().sort_by_distance((247.868827, 155.860031, 396.199107))[0], mode=Mode.SUBTRACT)
    add(rail_mounts_tool2.solids().sort_by_distance((247.868827, -129.139969, 396.199107))[0], mode=Mode.SUBTRACT)
    add(rail_mounts_tool3.solids().sort_by_distance((247.868827, 155.860031, 316.199107))[0], mode=Mode.SUBTRACT)
    add(rail_mounts_tool4.solids().sort_by_distance((247.868827, -129.139969, 316.199107))[0], mode=Mode.SUBTRACT)
    add(rail_mounts_tool5.solids().sort_by_distance((247.868827, 155.860031, 236.199107))[0], mode=Mode.SUBTRACT)
    add(rail_mounts_tool6.solids().sort_by_distance((247.868827, -129.139969, 236.199107))[0], mode=Mode.SUBTRACT)
    add(rail_mounts_tool7.solids().sort_by_distance((247.868827, 155.860031, 156.199107))[0], mode=Mode.SUBTRACT)
    add(rail_mounts_tool8.solids().sort_by_distance((247.868827, -129.139969, 156.199107))[0], mode=Mode.SUBTRACT)
    add(rail_mounts_tool9.solids().sort_by_distance((247.868827, 155.860031, 76.199107))[0], mode=Mode.SUBTRACT)
    add(rail_mounts_tool10.solids().sort_by_distance((247.868827, -129.139969, 76.199107))[0], mode=Mode.SUBTRACT)
    add(rail_mounts_tool11.solids().sort_by_distance((247.868827, -109.139969, 416.199107))[0], mode=Mode.SUBTRACT)
    add(rail_mounts_tool12.solids().sort_by_distance((247.868827, -109.139969, 51.199107))[0], mode=Mode.SUBTRACT)
    add(rail_mounts_tool13.solids().sort_by_distance((247.868827, -47.139969, 51.199107))[0], mode=Mode.SUBTRACT)
    add(rail_mounts_tool14.solids().sort_by_distance((247.868827, -47.139969, 416.199107))[0], mode=Mode.SUBTRACT)
    add(rail_mounts_tool15.solids().sort_by_distance((247.868827, 14.860031, 51.199107))[0], mode=Mode.SUBTRACT)
    add(rail_mounts_tool16.solids().sort_by_distance((247.868827, 14.860031, 416.199107))[0], mode=Mode.SUBTRACT)
    add(rail_mounts_tool17.solids().sort_by_distance((247.868827, 76.860031, 51.199107))[0], mode=Mode.SUBTRACT)
    add(rail_mounts_tool18.solids().sort_by_distance((247.868827, 76.860031, 416.199107))[0], mode=Mode.SUBTRACT)
    add(rail_mounts_tool19.solids().sort_by_distance((247.868827, 138.860031, 51.199107))[0], mode=Mode.SUBTRACT)
    add(rail_mounts_tool20.solids().sort_by_distance((247.868827, 138.860031, 416.199107))[0], mode=Mode.SUBTRACT)


solid = part.part
